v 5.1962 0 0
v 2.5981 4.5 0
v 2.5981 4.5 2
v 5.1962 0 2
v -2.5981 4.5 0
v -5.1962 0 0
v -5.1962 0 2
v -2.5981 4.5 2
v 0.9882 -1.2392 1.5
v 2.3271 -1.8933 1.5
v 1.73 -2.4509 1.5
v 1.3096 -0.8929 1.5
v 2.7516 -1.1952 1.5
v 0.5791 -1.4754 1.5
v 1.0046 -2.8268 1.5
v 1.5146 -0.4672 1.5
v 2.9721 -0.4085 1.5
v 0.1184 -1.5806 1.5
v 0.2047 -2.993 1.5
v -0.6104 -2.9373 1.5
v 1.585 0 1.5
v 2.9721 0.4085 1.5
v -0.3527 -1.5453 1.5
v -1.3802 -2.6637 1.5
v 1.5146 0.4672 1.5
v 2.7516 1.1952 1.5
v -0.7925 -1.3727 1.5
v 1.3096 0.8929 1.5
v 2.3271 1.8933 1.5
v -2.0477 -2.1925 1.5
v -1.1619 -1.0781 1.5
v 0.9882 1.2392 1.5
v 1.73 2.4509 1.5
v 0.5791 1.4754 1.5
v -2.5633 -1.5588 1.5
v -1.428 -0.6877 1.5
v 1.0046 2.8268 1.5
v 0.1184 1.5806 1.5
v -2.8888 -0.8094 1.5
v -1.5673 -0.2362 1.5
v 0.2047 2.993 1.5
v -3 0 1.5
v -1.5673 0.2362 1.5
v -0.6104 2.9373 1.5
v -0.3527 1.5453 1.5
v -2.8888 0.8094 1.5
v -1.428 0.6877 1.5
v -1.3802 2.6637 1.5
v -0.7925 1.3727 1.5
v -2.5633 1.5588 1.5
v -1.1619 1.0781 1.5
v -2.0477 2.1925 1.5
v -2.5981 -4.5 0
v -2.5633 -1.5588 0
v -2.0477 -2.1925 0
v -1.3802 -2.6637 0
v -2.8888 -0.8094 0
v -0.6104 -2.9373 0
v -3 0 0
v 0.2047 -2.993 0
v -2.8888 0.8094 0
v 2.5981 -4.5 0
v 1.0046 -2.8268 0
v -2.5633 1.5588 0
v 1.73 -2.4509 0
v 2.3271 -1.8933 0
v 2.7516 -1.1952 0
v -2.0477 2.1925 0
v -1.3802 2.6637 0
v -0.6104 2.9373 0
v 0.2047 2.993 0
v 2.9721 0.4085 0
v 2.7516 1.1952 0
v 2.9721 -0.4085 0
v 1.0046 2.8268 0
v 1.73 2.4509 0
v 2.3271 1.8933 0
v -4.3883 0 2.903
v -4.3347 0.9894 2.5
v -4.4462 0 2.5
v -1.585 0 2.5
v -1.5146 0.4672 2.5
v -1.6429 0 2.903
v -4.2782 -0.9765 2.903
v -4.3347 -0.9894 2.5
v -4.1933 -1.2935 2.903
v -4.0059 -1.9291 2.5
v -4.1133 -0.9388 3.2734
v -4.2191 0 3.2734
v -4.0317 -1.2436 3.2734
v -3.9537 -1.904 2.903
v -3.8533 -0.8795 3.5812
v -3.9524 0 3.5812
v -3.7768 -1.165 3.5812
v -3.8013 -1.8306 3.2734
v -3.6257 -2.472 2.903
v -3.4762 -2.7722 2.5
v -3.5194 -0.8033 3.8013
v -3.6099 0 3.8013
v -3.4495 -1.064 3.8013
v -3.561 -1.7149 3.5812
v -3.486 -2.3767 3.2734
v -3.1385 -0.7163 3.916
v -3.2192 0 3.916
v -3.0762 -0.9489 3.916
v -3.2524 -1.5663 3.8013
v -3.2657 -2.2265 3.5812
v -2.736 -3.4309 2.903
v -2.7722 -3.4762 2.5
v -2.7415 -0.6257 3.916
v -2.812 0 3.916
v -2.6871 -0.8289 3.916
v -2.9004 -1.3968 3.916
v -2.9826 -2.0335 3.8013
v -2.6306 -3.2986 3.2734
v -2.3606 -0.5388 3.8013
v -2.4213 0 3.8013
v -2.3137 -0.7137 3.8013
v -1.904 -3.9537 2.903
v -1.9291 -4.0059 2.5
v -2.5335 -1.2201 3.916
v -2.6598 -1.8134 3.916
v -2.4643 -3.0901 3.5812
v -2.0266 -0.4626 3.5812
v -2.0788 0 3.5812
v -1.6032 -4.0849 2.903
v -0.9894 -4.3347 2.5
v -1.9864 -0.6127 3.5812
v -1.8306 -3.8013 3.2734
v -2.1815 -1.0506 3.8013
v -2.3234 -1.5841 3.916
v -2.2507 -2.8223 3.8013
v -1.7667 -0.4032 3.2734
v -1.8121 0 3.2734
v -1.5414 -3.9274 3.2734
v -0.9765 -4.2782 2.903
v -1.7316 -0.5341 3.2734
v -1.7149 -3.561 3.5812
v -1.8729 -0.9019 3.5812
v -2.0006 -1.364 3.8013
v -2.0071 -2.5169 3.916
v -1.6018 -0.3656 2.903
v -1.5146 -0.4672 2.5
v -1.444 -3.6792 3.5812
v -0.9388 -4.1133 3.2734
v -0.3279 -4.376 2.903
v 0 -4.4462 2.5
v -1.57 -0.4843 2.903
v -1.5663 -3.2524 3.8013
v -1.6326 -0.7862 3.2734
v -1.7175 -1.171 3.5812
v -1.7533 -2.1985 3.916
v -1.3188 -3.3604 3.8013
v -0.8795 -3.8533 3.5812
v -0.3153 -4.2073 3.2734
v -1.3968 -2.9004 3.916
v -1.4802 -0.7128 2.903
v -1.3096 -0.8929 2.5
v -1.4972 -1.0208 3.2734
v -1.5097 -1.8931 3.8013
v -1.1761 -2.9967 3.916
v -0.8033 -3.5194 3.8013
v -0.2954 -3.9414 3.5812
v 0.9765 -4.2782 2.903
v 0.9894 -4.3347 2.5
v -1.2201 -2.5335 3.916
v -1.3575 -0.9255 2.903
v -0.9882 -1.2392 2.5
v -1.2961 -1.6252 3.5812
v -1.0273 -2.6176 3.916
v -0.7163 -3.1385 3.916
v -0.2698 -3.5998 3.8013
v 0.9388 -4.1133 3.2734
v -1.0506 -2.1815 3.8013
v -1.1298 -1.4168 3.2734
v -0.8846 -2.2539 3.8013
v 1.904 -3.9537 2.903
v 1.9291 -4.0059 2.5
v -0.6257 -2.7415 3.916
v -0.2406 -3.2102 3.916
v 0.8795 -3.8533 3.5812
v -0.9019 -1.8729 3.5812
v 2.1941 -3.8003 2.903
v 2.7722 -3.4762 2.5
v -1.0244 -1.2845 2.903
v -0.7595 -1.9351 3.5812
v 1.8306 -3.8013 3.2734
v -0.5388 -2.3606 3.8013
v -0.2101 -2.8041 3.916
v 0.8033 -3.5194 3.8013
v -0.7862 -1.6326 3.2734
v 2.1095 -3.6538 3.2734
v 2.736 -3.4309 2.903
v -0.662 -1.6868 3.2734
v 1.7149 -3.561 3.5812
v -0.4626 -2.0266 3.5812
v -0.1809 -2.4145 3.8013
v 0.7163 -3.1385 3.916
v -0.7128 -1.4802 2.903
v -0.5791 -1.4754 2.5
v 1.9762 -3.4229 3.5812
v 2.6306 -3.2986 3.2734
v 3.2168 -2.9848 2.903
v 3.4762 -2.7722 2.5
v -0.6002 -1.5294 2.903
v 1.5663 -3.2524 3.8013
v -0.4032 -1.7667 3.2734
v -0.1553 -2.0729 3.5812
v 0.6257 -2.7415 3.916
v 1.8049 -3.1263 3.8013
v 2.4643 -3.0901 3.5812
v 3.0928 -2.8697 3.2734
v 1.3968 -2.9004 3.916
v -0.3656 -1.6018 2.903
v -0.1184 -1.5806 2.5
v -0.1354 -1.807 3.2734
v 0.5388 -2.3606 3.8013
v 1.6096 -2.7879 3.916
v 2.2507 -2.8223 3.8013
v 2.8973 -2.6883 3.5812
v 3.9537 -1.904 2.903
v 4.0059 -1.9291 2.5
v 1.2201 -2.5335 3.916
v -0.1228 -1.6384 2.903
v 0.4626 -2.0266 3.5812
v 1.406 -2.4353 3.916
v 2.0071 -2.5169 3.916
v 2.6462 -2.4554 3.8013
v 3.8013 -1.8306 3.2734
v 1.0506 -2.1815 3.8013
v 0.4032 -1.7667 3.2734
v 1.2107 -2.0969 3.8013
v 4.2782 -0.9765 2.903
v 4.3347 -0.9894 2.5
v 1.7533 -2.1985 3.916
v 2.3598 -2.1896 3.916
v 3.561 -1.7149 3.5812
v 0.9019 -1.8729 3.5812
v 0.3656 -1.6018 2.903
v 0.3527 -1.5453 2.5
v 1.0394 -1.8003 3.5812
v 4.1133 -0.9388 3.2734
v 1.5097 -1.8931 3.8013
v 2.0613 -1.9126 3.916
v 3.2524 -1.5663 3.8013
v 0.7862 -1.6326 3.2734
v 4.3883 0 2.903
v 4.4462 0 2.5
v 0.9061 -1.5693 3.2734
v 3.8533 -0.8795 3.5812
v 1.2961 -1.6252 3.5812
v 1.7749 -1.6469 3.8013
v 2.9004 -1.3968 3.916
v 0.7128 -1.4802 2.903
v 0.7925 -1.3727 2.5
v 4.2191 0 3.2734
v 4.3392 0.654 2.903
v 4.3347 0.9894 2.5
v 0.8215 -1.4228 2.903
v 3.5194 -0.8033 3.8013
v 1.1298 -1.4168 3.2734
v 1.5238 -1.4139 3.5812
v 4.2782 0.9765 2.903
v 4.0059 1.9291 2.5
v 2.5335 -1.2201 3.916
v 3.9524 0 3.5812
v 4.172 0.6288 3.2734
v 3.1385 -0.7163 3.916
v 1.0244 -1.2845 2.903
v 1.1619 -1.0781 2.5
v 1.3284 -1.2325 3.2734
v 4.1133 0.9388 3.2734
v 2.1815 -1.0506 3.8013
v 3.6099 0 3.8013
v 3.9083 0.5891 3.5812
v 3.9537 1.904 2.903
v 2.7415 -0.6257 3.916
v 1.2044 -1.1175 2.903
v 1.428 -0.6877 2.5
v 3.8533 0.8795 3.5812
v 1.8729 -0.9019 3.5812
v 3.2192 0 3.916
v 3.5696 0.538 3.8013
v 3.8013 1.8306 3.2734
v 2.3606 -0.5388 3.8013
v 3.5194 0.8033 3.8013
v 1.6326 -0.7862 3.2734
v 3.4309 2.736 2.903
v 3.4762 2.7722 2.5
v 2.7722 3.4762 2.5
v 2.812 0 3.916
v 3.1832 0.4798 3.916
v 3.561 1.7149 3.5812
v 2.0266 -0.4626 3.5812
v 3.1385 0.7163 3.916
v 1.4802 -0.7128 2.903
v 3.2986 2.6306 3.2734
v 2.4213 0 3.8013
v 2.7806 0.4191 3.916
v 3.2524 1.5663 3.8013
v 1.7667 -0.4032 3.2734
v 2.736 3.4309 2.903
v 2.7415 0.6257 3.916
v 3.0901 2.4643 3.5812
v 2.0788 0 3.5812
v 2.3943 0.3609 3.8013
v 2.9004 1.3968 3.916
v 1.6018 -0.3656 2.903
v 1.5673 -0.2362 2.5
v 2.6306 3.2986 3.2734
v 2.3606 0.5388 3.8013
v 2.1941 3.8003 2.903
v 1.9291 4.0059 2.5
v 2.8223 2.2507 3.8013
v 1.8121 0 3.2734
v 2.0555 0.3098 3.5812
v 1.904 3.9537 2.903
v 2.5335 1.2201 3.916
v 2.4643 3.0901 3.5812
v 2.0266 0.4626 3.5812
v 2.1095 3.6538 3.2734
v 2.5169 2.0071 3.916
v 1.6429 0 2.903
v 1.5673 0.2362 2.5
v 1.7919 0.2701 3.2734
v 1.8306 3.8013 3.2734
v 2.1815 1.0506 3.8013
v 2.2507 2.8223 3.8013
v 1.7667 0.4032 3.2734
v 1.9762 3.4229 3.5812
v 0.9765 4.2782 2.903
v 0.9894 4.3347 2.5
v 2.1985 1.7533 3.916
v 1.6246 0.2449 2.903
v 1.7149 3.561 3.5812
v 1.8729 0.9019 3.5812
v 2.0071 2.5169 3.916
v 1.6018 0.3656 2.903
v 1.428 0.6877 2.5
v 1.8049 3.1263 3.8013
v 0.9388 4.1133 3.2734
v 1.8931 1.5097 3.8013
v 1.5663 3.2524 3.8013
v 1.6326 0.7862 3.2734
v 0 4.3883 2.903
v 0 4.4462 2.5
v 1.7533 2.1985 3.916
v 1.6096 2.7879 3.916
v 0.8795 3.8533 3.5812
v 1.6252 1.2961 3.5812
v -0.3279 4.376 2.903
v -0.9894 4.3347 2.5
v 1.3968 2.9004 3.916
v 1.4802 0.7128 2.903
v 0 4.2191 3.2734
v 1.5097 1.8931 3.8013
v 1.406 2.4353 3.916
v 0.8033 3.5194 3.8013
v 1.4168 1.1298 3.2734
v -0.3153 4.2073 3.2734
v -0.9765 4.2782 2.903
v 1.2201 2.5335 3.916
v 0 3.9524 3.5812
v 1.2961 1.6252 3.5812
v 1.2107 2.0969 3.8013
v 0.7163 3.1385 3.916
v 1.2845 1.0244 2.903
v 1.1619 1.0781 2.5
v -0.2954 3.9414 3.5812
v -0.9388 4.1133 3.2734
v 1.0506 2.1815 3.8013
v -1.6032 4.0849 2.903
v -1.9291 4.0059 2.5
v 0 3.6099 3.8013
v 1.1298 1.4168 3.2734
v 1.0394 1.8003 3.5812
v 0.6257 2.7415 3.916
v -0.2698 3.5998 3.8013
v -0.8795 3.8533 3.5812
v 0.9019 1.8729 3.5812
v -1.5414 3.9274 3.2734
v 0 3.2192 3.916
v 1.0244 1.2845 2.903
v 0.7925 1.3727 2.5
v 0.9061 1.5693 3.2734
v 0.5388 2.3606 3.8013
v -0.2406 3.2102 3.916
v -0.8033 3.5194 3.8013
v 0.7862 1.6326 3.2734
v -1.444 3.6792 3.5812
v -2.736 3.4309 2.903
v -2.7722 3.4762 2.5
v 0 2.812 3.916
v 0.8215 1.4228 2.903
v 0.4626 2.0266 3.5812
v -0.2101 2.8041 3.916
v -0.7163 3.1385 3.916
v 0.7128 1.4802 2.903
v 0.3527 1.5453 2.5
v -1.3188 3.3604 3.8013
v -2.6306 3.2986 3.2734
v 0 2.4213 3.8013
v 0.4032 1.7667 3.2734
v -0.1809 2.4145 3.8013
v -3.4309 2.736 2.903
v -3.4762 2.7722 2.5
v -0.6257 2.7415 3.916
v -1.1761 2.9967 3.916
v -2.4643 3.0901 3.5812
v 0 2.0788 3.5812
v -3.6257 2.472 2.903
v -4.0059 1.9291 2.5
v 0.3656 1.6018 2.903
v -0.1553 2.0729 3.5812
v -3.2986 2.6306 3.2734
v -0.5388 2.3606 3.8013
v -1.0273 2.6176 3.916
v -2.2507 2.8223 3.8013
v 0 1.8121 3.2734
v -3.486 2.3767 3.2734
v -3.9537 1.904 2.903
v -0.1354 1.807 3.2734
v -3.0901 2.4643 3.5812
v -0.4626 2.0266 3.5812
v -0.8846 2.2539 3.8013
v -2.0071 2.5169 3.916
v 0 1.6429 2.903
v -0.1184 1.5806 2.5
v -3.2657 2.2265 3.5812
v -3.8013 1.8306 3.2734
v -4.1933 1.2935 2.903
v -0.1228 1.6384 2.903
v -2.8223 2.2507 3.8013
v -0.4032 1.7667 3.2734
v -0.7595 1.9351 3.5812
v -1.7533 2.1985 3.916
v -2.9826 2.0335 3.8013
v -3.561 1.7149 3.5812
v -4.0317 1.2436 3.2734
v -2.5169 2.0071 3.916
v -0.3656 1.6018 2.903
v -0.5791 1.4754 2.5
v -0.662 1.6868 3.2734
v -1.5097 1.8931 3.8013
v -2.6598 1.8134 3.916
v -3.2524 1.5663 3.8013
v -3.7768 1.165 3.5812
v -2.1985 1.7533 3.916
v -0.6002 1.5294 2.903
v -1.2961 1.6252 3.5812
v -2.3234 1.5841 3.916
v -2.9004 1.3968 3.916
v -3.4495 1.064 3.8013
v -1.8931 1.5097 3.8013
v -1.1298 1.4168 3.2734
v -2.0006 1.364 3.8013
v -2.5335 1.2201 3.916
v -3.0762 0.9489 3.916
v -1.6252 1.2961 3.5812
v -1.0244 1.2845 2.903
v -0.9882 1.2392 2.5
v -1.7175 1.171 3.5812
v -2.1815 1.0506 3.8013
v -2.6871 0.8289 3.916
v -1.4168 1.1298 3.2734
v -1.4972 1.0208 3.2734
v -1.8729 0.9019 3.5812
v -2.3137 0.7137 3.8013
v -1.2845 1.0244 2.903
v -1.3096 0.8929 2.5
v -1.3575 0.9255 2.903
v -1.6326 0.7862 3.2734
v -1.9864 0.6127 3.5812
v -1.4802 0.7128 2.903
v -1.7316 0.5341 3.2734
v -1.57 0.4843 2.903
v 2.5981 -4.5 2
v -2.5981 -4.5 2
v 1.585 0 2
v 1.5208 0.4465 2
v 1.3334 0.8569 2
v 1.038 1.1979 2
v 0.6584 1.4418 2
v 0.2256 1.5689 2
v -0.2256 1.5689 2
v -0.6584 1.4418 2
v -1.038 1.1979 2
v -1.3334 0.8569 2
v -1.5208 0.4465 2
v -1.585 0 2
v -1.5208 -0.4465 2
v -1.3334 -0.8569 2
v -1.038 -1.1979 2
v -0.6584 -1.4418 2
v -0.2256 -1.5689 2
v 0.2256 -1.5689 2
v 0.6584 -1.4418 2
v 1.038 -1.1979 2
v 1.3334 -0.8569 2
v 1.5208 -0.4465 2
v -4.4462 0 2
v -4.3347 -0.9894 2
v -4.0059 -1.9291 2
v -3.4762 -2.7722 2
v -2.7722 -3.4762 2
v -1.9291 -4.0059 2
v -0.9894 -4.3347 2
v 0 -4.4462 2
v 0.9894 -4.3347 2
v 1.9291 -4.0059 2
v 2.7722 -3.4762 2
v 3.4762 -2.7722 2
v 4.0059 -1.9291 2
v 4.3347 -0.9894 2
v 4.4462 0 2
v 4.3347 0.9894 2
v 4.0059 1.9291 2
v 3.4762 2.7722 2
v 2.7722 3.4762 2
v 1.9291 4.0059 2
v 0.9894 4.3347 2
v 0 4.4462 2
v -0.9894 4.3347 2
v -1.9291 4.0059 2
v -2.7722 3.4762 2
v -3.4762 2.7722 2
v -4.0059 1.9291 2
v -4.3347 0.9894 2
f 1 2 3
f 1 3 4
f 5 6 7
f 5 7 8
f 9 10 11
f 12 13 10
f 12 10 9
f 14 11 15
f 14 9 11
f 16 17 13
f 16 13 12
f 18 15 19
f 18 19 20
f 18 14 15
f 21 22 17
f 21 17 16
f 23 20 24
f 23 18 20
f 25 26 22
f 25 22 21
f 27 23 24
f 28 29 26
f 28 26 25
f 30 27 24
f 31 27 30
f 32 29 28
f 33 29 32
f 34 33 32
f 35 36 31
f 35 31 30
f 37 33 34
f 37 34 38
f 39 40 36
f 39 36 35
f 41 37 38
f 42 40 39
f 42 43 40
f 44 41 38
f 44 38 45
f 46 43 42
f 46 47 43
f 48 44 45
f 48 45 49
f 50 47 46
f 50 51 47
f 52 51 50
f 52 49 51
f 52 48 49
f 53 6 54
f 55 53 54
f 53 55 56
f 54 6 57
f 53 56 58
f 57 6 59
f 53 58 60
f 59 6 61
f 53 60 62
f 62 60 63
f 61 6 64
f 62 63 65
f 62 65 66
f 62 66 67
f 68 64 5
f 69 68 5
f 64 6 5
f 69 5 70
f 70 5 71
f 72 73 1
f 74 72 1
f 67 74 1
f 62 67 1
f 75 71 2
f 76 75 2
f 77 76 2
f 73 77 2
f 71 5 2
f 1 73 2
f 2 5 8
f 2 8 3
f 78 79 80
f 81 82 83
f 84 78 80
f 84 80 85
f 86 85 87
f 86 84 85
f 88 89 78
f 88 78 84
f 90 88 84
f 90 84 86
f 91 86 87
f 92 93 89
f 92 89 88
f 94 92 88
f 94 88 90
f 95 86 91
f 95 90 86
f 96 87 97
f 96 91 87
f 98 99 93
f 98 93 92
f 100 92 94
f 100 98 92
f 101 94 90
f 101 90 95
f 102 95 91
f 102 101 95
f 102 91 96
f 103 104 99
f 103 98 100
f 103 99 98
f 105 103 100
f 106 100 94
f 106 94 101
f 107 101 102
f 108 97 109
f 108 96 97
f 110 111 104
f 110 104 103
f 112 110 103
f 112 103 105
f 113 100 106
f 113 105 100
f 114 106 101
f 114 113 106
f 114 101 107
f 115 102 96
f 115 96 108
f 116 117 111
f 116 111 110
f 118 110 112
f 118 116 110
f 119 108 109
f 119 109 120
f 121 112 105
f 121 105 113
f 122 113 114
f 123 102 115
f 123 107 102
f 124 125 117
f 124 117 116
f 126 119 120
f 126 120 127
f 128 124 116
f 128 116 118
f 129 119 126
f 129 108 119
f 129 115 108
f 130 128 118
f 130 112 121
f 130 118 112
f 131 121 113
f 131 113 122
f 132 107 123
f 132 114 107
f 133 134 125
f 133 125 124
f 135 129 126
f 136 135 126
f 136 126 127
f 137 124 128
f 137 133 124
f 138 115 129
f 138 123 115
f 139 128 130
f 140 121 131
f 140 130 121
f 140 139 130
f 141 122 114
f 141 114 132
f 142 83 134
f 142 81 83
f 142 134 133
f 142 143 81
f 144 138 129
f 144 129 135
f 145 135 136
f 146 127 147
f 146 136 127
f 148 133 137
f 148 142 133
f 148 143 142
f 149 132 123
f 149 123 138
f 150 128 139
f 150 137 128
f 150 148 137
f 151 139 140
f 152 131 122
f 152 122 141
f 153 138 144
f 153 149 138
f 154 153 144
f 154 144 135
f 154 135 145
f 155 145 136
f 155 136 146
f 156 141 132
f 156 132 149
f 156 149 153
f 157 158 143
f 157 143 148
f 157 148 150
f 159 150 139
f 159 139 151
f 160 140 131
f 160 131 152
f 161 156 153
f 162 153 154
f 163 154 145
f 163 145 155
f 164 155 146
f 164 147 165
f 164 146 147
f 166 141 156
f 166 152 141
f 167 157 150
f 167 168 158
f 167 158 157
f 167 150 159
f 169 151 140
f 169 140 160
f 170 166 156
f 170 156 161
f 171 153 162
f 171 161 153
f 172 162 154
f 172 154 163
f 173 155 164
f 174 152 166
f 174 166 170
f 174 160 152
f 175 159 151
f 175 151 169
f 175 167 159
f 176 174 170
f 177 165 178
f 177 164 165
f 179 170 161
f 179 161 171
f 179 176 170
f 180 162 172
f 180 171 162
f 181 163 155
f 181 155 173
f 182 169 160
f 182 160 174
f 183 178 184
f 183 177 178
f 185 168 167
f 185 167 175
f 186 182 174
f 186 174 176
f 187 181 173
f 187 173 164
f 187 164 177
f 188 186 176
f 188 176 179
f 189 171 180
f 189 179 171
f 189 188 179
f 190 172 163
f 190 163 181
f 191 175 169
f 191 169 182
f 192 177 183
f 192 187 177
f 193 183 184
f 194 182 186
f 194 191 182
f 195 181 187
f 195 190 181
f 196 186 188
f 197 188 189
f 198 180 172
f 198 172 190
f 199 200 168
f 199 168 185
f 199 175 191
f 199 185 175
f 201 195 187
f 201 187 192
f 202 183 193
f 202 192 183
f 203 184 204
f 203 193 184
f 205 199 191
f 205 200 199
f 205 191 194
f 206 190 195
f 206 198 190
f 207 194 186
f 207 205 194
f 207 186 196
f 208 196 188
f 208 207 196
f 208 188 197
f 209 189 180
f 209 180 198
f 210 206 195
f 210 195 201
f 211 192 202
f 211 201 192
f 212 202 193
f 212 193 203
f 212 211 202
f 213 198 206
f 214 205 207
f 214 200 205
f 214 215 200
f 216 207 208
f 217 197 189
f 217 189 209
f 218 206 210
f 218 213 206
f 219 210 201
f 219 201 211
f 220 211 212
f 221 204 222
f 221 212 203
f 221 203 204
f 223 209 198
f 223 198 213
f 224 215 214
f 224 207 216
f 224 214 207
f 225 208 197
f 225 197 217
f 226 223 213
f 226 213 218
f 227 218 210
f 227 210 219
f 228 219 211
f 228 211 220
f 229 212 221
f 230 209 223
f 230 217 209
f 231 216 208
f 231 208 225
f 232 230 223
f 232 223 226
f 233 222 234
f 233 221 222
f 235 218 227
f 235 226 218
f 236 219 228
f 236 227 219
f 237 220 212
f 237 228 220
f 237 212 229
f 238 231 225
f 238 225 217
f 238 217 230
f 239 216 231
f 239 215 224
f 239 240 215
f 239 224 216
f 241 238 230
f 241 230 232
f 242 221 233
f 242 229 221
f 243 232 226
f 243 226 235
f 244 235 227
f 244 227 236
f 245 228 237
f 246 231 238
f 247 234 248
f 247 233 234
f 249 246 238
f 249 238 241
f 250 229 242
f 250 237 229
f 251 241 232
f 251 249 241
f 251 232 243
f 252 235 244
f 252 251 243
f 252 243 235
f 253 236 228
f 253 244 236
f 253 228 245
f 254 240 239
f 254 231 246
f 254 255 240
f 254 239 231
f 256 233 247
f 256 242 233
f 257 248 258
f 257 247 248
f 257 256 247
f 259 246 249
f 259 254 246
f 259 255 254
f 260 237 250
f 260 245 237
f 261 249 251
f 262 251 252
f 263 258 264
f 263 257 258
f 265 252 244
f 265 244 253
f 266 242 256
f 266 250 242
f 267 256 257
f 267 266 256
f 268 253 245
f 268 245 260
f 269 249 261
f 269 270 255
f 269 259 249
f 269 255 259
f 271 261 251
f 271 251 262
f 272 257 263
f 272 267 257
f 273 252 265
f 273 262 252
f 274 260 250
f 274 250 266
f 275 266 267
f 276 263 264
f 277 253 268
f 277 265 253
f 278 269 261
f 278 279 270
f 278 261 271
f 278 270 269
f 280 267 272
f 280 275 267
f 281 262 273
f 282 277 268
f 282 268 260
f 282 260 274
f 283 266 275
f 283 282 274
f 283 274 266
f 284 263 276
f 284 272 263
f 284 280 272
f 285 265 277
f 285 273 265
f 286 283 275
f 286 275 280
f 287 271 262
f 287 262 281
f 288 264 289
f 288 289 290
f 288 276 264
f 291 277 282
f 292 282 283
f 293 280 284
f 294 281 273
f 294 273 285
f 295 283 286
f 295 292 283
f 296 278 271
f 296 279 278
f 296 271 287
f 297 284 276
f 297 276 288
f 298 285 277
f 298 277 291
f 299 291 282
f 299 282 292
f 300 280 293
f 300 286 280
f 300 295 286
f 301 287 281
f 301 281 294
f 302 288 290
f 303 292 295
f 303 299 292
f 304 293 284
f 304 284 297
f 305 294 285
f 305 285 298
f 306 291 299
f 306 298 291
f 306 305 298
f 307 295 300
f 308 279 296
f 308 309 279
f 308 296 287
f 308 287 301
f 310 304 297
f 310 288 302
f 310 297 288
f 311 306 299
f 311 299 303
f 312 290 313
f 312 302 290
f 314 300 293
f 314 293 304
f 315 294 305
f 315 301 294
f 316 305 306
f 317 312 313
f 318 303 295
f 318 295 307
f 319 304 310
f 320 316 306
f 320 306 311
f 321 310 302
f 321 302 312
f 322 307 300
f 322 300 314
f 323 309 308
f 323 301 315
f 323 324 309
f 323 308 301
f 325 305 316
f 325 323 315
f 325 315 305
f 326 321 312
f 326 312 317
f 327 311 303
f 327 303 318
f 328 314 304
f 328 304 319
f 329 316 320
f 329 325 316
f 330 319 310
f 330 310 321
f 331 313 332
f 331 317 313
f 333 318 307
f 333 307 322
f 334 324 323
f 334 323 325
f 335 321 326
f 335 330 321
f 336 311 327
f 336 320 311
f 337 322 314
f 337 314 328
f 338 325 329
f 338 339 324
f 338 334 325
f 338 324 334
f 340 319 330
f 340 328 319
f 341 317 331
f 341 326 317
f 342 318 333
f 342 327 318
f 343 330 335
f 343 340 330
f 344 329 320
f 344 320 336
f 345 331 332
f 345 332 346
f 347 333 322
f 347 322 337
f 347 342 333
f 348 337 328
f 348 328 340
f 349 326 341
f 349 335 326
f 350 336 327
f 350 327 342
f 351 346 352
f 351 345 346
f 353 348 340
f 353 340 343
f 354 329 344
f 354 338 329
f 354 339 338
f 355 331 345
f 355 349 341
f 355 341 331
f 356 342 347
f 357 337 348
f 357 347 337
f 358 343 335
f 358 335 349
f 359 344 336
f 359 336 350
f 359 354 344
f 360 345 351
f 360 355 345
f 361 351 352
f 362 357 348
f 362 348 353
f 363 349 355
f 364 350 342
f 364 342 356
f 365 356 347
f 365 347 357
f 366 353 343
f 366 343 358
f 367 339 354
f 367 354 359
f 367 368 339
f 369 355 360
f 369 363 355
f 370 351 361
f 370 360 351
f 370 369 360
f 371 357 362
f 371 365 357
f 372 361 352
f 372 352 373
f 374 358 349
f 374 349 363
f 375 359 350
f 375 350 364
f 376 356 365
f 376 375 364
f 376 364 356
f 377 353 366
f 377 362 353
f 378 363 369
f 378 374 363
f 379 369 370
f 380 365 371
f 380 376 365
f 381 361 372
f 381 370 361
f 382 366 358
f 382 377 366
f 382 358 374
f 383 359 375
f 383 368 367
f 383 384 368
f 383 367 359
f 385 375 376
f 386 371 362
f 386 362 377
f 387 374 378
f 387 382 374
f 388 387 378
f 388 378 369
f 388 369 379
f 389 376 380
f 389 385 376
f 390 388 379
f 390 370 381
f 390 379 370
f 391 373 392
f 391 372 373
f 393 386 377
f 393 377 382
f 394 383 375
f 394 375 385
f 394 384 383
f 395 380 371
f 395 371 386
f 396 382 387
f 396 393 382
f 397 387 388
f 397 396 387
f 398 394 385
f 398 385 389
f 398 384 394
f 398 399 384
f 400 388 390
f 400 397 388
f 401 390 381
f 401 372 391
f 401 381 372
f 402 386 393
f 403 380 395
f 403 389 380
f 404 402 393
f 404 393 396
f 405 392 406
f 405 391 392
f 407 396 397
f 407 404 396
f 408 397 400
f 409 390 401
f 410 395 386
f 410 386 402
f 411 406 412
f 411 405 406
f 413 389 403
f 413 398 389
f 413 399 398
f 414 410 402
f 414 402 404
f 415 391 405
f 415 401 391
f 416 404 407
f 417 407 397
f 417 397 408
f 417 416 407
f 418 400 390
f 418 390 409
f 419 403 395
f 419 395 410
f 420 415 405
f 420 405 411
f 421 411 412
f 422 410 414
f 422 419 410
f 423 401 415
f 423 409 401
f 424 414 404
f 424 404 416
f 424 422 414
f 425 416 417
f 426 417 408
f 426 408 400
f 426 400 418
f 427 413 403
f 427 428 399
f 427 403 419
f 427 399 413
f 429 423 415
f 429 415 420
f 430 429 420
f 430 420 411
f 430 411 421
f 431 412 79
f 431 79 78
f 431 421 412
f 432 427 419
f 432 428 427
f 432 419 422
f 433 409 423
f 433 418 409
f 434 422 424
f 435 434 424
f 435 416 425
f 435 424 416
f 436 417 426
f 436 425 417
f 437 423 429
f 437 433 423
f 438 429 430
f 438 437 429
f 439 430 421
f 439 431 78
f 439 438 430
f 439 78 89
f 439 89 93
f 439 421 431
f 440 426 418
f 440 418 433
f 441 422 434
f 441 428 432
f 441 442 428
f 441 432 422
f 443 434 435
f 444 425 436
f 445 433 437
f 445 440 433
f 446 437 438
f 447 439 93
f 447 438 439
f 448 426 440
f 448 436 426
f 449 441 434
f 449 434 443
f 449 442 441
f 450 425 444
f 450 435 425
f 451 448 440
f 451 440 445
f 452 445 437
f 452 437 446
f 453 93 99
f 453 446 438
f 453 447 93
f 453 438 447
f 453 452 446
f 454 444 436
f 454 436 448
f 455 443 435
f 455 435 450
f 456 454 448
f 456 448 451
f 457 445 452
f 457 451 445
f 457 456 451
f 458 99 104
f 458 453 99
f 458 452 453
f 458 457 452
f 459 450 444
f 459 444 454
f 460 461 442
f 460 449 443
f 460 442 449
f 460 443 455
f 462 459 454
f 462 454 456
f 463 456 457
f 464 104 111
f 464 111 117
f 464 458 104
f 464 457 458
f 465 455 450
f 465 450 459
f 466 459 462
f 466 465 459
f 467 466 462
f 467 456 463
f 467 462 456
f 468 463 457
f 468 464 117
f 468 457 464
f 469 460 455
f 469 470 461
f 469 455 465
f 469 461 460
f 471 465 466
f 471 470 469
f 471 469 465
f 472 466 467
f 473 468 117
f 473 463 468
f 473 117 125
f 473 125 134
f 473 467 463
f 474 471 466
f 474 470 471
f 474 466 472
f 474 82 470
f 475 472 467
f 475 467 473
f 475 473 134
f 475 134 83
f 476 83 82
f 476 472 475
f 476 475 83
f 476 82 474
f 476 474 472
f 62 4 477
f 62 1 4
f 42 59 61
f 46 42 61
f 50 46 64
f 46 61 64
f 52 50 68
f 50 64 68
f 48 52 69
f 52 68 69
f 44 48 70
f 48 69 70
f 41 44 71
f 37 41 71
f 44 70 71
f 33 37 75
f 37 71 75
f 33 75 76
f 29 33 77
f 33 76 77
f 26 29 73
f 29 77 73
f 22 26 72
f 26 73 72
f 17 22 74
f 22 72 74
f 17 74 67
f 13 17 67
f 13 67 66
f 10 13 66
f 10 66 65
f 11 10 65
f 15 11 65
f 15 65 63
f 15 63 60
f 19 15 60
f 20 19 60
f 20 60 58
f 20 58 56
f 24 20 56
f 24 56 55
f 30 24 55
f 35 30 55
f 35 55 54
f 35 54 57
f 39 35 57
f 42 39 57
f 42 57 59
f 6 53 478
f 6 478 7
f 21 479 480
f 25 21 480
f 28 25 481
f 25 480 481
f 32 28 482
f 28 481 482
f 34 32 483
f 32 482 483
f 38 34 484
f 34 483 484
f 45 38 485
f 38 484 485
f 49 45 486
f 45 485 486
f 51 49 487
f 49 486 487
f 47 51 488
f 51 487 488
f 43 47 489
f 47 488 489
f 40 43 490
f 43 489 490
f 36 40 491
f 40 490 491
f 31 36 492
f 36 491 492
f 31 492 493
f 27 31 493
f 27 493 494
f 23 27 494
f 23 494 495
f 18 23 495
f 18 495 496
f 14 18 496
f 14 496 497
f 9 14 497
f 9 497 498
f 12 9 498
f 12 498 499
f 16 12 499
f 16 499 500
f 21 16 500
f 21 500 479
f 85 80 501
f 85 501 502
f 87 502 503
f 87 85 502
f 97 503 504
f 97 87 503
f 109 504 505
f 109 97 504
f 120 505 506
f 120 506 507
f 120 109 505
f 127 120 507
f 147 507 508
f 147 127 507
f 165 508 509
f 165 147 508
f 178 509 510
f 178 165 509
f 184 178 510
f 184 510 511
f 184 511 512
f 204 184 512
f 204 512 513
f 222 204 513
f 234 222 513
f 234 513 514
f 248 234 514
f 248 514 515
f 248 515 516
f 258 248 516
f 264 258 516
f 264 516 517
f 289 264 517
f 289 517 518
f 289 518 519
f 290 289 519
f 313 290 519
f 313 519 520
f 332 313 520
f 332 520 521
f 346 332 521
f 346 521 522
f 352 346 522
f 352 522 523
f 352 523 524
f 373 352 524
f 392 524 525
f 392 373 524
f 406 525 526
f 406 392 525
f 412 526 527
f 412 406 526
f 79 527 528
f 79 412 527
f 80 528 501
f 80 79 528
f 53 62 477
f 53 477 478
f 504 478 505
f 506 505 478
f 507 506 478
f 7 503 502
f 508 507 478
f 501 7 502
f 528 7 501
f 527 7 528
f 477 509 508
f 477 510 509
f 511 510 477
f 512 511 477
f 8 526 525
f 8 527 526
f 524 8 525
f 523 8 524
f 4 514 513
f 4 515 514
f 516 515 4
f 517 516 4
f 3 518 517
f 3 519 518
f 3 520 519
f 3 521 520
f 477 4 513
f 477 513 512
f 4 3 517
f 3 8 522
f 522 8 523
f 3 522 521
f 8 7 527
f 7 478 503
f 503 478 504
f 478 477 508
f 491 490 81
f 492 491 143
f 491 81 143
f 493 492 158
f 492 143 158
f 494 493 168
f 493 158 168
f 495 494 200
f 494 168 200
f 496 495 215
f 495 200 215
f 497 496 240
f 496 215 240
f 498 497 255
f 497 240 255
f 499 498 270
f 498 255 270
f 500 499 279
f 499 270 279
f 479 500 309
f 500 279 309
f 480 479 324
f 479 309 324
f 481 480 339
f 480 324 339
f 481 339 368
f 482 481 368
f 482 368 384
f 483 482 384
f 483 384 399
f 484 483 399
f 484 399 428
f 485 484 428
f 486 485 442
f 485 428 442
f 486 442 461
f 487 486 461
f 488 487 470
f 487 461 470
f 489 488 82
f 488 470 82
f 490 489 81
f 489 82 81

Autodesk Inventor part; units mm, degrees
ref_plane "YZ Plane" through (0, 0, 0) normal (1, 0, 0) x (0, 1, 0)
ref_plane "XZ Plane" through (0, 0, 0) normal (0, 1, 0) x (-1, 0, 0)
ref_plane "XY Plane" through (0, 0, 0) normal (0, 0, 1) x (1, 0, 0)
sketch "Sketch2" plane through (0, 0, 0) normal (0, 0, 1) x (1, 0, 0)
  line L0 (-5.1962, 0) -> (-2.5981, 4.5)
  line L1 (-2.5981, 4.5) -> (2.5981, 4.5)
  line L2 (2.5981, 4.5) -> (5.1962, 0)
  line L3 (5.1962, 0) -> (2.5981, -4.5)
  line L4 (2.5981, -4.5) -> (-2.5981, -4.5)
  line L5 (-2.5981, -4.5) -> (-5.1962, 0)
  point P0 (0, 0)
  point P1 (0, 0)
  dimension "d0" = 9
extrude "Extrusion1" add sketch "Sketch2" along normal blind 2
sketch "Sketch3" plane through (0, 0, 0) normal (0, 1, 0) x (-1, 0, 0)
  line L0 (5.1962, 0) -> (5.1962, 2) projected
  line L1 (2.5981, 2) -> (-2.5981, 2) projected
  line L2 (0, 2) -> (1.585, 2)
  line L3 (2.5981, 2) -> (5.1962, 2) projected
  line L4 (5.1962, 2) -> (4.4462, 2)
  line L5 (1.585, 2) -> (1.585, 2.5)
  line L6 (4.4462, 2) -> (4.4462, 2.5)
  arc A0 (4.4462, 2.5) -> (1.585, 2.5) centre (3.0156, 2.5) ccw
  line L7 (0, 2) -> (0, 5.5151)
  point P0 (0, 0)
  dimension "d3" = 1.585
  dimension "d4" = 0.75
  dimension "d5" = 0.5
  dimension "d6" = 0.5
revolve "Revolution1" add sketch "Sketch3" angle 360 about axis through (0, 0, 2) along (0, 0, 1)
sketch "Sketch4" plane through (0, 0, 2) normal (0, 0, 1) x (1, 0, 0)
  circle A0 centre (0, 0) radius 1.585 projected
  point P0 (0, 0)
extrude "Extrusion2" cut sketch "Sketch4" against normal through all
sketch "Sketch5" plane through (0, 0, 0) normal (0, 0, -1) x (-1, 0, 0)
  circle A0 centre (0, 0) radius 3
  dimension "d10" = 6
extrude "Extrusion3" cut sketch "Sketch5" against normal blind 1.5
properties part number "sealNut" material "Nickel-Copper Alloy 400"
